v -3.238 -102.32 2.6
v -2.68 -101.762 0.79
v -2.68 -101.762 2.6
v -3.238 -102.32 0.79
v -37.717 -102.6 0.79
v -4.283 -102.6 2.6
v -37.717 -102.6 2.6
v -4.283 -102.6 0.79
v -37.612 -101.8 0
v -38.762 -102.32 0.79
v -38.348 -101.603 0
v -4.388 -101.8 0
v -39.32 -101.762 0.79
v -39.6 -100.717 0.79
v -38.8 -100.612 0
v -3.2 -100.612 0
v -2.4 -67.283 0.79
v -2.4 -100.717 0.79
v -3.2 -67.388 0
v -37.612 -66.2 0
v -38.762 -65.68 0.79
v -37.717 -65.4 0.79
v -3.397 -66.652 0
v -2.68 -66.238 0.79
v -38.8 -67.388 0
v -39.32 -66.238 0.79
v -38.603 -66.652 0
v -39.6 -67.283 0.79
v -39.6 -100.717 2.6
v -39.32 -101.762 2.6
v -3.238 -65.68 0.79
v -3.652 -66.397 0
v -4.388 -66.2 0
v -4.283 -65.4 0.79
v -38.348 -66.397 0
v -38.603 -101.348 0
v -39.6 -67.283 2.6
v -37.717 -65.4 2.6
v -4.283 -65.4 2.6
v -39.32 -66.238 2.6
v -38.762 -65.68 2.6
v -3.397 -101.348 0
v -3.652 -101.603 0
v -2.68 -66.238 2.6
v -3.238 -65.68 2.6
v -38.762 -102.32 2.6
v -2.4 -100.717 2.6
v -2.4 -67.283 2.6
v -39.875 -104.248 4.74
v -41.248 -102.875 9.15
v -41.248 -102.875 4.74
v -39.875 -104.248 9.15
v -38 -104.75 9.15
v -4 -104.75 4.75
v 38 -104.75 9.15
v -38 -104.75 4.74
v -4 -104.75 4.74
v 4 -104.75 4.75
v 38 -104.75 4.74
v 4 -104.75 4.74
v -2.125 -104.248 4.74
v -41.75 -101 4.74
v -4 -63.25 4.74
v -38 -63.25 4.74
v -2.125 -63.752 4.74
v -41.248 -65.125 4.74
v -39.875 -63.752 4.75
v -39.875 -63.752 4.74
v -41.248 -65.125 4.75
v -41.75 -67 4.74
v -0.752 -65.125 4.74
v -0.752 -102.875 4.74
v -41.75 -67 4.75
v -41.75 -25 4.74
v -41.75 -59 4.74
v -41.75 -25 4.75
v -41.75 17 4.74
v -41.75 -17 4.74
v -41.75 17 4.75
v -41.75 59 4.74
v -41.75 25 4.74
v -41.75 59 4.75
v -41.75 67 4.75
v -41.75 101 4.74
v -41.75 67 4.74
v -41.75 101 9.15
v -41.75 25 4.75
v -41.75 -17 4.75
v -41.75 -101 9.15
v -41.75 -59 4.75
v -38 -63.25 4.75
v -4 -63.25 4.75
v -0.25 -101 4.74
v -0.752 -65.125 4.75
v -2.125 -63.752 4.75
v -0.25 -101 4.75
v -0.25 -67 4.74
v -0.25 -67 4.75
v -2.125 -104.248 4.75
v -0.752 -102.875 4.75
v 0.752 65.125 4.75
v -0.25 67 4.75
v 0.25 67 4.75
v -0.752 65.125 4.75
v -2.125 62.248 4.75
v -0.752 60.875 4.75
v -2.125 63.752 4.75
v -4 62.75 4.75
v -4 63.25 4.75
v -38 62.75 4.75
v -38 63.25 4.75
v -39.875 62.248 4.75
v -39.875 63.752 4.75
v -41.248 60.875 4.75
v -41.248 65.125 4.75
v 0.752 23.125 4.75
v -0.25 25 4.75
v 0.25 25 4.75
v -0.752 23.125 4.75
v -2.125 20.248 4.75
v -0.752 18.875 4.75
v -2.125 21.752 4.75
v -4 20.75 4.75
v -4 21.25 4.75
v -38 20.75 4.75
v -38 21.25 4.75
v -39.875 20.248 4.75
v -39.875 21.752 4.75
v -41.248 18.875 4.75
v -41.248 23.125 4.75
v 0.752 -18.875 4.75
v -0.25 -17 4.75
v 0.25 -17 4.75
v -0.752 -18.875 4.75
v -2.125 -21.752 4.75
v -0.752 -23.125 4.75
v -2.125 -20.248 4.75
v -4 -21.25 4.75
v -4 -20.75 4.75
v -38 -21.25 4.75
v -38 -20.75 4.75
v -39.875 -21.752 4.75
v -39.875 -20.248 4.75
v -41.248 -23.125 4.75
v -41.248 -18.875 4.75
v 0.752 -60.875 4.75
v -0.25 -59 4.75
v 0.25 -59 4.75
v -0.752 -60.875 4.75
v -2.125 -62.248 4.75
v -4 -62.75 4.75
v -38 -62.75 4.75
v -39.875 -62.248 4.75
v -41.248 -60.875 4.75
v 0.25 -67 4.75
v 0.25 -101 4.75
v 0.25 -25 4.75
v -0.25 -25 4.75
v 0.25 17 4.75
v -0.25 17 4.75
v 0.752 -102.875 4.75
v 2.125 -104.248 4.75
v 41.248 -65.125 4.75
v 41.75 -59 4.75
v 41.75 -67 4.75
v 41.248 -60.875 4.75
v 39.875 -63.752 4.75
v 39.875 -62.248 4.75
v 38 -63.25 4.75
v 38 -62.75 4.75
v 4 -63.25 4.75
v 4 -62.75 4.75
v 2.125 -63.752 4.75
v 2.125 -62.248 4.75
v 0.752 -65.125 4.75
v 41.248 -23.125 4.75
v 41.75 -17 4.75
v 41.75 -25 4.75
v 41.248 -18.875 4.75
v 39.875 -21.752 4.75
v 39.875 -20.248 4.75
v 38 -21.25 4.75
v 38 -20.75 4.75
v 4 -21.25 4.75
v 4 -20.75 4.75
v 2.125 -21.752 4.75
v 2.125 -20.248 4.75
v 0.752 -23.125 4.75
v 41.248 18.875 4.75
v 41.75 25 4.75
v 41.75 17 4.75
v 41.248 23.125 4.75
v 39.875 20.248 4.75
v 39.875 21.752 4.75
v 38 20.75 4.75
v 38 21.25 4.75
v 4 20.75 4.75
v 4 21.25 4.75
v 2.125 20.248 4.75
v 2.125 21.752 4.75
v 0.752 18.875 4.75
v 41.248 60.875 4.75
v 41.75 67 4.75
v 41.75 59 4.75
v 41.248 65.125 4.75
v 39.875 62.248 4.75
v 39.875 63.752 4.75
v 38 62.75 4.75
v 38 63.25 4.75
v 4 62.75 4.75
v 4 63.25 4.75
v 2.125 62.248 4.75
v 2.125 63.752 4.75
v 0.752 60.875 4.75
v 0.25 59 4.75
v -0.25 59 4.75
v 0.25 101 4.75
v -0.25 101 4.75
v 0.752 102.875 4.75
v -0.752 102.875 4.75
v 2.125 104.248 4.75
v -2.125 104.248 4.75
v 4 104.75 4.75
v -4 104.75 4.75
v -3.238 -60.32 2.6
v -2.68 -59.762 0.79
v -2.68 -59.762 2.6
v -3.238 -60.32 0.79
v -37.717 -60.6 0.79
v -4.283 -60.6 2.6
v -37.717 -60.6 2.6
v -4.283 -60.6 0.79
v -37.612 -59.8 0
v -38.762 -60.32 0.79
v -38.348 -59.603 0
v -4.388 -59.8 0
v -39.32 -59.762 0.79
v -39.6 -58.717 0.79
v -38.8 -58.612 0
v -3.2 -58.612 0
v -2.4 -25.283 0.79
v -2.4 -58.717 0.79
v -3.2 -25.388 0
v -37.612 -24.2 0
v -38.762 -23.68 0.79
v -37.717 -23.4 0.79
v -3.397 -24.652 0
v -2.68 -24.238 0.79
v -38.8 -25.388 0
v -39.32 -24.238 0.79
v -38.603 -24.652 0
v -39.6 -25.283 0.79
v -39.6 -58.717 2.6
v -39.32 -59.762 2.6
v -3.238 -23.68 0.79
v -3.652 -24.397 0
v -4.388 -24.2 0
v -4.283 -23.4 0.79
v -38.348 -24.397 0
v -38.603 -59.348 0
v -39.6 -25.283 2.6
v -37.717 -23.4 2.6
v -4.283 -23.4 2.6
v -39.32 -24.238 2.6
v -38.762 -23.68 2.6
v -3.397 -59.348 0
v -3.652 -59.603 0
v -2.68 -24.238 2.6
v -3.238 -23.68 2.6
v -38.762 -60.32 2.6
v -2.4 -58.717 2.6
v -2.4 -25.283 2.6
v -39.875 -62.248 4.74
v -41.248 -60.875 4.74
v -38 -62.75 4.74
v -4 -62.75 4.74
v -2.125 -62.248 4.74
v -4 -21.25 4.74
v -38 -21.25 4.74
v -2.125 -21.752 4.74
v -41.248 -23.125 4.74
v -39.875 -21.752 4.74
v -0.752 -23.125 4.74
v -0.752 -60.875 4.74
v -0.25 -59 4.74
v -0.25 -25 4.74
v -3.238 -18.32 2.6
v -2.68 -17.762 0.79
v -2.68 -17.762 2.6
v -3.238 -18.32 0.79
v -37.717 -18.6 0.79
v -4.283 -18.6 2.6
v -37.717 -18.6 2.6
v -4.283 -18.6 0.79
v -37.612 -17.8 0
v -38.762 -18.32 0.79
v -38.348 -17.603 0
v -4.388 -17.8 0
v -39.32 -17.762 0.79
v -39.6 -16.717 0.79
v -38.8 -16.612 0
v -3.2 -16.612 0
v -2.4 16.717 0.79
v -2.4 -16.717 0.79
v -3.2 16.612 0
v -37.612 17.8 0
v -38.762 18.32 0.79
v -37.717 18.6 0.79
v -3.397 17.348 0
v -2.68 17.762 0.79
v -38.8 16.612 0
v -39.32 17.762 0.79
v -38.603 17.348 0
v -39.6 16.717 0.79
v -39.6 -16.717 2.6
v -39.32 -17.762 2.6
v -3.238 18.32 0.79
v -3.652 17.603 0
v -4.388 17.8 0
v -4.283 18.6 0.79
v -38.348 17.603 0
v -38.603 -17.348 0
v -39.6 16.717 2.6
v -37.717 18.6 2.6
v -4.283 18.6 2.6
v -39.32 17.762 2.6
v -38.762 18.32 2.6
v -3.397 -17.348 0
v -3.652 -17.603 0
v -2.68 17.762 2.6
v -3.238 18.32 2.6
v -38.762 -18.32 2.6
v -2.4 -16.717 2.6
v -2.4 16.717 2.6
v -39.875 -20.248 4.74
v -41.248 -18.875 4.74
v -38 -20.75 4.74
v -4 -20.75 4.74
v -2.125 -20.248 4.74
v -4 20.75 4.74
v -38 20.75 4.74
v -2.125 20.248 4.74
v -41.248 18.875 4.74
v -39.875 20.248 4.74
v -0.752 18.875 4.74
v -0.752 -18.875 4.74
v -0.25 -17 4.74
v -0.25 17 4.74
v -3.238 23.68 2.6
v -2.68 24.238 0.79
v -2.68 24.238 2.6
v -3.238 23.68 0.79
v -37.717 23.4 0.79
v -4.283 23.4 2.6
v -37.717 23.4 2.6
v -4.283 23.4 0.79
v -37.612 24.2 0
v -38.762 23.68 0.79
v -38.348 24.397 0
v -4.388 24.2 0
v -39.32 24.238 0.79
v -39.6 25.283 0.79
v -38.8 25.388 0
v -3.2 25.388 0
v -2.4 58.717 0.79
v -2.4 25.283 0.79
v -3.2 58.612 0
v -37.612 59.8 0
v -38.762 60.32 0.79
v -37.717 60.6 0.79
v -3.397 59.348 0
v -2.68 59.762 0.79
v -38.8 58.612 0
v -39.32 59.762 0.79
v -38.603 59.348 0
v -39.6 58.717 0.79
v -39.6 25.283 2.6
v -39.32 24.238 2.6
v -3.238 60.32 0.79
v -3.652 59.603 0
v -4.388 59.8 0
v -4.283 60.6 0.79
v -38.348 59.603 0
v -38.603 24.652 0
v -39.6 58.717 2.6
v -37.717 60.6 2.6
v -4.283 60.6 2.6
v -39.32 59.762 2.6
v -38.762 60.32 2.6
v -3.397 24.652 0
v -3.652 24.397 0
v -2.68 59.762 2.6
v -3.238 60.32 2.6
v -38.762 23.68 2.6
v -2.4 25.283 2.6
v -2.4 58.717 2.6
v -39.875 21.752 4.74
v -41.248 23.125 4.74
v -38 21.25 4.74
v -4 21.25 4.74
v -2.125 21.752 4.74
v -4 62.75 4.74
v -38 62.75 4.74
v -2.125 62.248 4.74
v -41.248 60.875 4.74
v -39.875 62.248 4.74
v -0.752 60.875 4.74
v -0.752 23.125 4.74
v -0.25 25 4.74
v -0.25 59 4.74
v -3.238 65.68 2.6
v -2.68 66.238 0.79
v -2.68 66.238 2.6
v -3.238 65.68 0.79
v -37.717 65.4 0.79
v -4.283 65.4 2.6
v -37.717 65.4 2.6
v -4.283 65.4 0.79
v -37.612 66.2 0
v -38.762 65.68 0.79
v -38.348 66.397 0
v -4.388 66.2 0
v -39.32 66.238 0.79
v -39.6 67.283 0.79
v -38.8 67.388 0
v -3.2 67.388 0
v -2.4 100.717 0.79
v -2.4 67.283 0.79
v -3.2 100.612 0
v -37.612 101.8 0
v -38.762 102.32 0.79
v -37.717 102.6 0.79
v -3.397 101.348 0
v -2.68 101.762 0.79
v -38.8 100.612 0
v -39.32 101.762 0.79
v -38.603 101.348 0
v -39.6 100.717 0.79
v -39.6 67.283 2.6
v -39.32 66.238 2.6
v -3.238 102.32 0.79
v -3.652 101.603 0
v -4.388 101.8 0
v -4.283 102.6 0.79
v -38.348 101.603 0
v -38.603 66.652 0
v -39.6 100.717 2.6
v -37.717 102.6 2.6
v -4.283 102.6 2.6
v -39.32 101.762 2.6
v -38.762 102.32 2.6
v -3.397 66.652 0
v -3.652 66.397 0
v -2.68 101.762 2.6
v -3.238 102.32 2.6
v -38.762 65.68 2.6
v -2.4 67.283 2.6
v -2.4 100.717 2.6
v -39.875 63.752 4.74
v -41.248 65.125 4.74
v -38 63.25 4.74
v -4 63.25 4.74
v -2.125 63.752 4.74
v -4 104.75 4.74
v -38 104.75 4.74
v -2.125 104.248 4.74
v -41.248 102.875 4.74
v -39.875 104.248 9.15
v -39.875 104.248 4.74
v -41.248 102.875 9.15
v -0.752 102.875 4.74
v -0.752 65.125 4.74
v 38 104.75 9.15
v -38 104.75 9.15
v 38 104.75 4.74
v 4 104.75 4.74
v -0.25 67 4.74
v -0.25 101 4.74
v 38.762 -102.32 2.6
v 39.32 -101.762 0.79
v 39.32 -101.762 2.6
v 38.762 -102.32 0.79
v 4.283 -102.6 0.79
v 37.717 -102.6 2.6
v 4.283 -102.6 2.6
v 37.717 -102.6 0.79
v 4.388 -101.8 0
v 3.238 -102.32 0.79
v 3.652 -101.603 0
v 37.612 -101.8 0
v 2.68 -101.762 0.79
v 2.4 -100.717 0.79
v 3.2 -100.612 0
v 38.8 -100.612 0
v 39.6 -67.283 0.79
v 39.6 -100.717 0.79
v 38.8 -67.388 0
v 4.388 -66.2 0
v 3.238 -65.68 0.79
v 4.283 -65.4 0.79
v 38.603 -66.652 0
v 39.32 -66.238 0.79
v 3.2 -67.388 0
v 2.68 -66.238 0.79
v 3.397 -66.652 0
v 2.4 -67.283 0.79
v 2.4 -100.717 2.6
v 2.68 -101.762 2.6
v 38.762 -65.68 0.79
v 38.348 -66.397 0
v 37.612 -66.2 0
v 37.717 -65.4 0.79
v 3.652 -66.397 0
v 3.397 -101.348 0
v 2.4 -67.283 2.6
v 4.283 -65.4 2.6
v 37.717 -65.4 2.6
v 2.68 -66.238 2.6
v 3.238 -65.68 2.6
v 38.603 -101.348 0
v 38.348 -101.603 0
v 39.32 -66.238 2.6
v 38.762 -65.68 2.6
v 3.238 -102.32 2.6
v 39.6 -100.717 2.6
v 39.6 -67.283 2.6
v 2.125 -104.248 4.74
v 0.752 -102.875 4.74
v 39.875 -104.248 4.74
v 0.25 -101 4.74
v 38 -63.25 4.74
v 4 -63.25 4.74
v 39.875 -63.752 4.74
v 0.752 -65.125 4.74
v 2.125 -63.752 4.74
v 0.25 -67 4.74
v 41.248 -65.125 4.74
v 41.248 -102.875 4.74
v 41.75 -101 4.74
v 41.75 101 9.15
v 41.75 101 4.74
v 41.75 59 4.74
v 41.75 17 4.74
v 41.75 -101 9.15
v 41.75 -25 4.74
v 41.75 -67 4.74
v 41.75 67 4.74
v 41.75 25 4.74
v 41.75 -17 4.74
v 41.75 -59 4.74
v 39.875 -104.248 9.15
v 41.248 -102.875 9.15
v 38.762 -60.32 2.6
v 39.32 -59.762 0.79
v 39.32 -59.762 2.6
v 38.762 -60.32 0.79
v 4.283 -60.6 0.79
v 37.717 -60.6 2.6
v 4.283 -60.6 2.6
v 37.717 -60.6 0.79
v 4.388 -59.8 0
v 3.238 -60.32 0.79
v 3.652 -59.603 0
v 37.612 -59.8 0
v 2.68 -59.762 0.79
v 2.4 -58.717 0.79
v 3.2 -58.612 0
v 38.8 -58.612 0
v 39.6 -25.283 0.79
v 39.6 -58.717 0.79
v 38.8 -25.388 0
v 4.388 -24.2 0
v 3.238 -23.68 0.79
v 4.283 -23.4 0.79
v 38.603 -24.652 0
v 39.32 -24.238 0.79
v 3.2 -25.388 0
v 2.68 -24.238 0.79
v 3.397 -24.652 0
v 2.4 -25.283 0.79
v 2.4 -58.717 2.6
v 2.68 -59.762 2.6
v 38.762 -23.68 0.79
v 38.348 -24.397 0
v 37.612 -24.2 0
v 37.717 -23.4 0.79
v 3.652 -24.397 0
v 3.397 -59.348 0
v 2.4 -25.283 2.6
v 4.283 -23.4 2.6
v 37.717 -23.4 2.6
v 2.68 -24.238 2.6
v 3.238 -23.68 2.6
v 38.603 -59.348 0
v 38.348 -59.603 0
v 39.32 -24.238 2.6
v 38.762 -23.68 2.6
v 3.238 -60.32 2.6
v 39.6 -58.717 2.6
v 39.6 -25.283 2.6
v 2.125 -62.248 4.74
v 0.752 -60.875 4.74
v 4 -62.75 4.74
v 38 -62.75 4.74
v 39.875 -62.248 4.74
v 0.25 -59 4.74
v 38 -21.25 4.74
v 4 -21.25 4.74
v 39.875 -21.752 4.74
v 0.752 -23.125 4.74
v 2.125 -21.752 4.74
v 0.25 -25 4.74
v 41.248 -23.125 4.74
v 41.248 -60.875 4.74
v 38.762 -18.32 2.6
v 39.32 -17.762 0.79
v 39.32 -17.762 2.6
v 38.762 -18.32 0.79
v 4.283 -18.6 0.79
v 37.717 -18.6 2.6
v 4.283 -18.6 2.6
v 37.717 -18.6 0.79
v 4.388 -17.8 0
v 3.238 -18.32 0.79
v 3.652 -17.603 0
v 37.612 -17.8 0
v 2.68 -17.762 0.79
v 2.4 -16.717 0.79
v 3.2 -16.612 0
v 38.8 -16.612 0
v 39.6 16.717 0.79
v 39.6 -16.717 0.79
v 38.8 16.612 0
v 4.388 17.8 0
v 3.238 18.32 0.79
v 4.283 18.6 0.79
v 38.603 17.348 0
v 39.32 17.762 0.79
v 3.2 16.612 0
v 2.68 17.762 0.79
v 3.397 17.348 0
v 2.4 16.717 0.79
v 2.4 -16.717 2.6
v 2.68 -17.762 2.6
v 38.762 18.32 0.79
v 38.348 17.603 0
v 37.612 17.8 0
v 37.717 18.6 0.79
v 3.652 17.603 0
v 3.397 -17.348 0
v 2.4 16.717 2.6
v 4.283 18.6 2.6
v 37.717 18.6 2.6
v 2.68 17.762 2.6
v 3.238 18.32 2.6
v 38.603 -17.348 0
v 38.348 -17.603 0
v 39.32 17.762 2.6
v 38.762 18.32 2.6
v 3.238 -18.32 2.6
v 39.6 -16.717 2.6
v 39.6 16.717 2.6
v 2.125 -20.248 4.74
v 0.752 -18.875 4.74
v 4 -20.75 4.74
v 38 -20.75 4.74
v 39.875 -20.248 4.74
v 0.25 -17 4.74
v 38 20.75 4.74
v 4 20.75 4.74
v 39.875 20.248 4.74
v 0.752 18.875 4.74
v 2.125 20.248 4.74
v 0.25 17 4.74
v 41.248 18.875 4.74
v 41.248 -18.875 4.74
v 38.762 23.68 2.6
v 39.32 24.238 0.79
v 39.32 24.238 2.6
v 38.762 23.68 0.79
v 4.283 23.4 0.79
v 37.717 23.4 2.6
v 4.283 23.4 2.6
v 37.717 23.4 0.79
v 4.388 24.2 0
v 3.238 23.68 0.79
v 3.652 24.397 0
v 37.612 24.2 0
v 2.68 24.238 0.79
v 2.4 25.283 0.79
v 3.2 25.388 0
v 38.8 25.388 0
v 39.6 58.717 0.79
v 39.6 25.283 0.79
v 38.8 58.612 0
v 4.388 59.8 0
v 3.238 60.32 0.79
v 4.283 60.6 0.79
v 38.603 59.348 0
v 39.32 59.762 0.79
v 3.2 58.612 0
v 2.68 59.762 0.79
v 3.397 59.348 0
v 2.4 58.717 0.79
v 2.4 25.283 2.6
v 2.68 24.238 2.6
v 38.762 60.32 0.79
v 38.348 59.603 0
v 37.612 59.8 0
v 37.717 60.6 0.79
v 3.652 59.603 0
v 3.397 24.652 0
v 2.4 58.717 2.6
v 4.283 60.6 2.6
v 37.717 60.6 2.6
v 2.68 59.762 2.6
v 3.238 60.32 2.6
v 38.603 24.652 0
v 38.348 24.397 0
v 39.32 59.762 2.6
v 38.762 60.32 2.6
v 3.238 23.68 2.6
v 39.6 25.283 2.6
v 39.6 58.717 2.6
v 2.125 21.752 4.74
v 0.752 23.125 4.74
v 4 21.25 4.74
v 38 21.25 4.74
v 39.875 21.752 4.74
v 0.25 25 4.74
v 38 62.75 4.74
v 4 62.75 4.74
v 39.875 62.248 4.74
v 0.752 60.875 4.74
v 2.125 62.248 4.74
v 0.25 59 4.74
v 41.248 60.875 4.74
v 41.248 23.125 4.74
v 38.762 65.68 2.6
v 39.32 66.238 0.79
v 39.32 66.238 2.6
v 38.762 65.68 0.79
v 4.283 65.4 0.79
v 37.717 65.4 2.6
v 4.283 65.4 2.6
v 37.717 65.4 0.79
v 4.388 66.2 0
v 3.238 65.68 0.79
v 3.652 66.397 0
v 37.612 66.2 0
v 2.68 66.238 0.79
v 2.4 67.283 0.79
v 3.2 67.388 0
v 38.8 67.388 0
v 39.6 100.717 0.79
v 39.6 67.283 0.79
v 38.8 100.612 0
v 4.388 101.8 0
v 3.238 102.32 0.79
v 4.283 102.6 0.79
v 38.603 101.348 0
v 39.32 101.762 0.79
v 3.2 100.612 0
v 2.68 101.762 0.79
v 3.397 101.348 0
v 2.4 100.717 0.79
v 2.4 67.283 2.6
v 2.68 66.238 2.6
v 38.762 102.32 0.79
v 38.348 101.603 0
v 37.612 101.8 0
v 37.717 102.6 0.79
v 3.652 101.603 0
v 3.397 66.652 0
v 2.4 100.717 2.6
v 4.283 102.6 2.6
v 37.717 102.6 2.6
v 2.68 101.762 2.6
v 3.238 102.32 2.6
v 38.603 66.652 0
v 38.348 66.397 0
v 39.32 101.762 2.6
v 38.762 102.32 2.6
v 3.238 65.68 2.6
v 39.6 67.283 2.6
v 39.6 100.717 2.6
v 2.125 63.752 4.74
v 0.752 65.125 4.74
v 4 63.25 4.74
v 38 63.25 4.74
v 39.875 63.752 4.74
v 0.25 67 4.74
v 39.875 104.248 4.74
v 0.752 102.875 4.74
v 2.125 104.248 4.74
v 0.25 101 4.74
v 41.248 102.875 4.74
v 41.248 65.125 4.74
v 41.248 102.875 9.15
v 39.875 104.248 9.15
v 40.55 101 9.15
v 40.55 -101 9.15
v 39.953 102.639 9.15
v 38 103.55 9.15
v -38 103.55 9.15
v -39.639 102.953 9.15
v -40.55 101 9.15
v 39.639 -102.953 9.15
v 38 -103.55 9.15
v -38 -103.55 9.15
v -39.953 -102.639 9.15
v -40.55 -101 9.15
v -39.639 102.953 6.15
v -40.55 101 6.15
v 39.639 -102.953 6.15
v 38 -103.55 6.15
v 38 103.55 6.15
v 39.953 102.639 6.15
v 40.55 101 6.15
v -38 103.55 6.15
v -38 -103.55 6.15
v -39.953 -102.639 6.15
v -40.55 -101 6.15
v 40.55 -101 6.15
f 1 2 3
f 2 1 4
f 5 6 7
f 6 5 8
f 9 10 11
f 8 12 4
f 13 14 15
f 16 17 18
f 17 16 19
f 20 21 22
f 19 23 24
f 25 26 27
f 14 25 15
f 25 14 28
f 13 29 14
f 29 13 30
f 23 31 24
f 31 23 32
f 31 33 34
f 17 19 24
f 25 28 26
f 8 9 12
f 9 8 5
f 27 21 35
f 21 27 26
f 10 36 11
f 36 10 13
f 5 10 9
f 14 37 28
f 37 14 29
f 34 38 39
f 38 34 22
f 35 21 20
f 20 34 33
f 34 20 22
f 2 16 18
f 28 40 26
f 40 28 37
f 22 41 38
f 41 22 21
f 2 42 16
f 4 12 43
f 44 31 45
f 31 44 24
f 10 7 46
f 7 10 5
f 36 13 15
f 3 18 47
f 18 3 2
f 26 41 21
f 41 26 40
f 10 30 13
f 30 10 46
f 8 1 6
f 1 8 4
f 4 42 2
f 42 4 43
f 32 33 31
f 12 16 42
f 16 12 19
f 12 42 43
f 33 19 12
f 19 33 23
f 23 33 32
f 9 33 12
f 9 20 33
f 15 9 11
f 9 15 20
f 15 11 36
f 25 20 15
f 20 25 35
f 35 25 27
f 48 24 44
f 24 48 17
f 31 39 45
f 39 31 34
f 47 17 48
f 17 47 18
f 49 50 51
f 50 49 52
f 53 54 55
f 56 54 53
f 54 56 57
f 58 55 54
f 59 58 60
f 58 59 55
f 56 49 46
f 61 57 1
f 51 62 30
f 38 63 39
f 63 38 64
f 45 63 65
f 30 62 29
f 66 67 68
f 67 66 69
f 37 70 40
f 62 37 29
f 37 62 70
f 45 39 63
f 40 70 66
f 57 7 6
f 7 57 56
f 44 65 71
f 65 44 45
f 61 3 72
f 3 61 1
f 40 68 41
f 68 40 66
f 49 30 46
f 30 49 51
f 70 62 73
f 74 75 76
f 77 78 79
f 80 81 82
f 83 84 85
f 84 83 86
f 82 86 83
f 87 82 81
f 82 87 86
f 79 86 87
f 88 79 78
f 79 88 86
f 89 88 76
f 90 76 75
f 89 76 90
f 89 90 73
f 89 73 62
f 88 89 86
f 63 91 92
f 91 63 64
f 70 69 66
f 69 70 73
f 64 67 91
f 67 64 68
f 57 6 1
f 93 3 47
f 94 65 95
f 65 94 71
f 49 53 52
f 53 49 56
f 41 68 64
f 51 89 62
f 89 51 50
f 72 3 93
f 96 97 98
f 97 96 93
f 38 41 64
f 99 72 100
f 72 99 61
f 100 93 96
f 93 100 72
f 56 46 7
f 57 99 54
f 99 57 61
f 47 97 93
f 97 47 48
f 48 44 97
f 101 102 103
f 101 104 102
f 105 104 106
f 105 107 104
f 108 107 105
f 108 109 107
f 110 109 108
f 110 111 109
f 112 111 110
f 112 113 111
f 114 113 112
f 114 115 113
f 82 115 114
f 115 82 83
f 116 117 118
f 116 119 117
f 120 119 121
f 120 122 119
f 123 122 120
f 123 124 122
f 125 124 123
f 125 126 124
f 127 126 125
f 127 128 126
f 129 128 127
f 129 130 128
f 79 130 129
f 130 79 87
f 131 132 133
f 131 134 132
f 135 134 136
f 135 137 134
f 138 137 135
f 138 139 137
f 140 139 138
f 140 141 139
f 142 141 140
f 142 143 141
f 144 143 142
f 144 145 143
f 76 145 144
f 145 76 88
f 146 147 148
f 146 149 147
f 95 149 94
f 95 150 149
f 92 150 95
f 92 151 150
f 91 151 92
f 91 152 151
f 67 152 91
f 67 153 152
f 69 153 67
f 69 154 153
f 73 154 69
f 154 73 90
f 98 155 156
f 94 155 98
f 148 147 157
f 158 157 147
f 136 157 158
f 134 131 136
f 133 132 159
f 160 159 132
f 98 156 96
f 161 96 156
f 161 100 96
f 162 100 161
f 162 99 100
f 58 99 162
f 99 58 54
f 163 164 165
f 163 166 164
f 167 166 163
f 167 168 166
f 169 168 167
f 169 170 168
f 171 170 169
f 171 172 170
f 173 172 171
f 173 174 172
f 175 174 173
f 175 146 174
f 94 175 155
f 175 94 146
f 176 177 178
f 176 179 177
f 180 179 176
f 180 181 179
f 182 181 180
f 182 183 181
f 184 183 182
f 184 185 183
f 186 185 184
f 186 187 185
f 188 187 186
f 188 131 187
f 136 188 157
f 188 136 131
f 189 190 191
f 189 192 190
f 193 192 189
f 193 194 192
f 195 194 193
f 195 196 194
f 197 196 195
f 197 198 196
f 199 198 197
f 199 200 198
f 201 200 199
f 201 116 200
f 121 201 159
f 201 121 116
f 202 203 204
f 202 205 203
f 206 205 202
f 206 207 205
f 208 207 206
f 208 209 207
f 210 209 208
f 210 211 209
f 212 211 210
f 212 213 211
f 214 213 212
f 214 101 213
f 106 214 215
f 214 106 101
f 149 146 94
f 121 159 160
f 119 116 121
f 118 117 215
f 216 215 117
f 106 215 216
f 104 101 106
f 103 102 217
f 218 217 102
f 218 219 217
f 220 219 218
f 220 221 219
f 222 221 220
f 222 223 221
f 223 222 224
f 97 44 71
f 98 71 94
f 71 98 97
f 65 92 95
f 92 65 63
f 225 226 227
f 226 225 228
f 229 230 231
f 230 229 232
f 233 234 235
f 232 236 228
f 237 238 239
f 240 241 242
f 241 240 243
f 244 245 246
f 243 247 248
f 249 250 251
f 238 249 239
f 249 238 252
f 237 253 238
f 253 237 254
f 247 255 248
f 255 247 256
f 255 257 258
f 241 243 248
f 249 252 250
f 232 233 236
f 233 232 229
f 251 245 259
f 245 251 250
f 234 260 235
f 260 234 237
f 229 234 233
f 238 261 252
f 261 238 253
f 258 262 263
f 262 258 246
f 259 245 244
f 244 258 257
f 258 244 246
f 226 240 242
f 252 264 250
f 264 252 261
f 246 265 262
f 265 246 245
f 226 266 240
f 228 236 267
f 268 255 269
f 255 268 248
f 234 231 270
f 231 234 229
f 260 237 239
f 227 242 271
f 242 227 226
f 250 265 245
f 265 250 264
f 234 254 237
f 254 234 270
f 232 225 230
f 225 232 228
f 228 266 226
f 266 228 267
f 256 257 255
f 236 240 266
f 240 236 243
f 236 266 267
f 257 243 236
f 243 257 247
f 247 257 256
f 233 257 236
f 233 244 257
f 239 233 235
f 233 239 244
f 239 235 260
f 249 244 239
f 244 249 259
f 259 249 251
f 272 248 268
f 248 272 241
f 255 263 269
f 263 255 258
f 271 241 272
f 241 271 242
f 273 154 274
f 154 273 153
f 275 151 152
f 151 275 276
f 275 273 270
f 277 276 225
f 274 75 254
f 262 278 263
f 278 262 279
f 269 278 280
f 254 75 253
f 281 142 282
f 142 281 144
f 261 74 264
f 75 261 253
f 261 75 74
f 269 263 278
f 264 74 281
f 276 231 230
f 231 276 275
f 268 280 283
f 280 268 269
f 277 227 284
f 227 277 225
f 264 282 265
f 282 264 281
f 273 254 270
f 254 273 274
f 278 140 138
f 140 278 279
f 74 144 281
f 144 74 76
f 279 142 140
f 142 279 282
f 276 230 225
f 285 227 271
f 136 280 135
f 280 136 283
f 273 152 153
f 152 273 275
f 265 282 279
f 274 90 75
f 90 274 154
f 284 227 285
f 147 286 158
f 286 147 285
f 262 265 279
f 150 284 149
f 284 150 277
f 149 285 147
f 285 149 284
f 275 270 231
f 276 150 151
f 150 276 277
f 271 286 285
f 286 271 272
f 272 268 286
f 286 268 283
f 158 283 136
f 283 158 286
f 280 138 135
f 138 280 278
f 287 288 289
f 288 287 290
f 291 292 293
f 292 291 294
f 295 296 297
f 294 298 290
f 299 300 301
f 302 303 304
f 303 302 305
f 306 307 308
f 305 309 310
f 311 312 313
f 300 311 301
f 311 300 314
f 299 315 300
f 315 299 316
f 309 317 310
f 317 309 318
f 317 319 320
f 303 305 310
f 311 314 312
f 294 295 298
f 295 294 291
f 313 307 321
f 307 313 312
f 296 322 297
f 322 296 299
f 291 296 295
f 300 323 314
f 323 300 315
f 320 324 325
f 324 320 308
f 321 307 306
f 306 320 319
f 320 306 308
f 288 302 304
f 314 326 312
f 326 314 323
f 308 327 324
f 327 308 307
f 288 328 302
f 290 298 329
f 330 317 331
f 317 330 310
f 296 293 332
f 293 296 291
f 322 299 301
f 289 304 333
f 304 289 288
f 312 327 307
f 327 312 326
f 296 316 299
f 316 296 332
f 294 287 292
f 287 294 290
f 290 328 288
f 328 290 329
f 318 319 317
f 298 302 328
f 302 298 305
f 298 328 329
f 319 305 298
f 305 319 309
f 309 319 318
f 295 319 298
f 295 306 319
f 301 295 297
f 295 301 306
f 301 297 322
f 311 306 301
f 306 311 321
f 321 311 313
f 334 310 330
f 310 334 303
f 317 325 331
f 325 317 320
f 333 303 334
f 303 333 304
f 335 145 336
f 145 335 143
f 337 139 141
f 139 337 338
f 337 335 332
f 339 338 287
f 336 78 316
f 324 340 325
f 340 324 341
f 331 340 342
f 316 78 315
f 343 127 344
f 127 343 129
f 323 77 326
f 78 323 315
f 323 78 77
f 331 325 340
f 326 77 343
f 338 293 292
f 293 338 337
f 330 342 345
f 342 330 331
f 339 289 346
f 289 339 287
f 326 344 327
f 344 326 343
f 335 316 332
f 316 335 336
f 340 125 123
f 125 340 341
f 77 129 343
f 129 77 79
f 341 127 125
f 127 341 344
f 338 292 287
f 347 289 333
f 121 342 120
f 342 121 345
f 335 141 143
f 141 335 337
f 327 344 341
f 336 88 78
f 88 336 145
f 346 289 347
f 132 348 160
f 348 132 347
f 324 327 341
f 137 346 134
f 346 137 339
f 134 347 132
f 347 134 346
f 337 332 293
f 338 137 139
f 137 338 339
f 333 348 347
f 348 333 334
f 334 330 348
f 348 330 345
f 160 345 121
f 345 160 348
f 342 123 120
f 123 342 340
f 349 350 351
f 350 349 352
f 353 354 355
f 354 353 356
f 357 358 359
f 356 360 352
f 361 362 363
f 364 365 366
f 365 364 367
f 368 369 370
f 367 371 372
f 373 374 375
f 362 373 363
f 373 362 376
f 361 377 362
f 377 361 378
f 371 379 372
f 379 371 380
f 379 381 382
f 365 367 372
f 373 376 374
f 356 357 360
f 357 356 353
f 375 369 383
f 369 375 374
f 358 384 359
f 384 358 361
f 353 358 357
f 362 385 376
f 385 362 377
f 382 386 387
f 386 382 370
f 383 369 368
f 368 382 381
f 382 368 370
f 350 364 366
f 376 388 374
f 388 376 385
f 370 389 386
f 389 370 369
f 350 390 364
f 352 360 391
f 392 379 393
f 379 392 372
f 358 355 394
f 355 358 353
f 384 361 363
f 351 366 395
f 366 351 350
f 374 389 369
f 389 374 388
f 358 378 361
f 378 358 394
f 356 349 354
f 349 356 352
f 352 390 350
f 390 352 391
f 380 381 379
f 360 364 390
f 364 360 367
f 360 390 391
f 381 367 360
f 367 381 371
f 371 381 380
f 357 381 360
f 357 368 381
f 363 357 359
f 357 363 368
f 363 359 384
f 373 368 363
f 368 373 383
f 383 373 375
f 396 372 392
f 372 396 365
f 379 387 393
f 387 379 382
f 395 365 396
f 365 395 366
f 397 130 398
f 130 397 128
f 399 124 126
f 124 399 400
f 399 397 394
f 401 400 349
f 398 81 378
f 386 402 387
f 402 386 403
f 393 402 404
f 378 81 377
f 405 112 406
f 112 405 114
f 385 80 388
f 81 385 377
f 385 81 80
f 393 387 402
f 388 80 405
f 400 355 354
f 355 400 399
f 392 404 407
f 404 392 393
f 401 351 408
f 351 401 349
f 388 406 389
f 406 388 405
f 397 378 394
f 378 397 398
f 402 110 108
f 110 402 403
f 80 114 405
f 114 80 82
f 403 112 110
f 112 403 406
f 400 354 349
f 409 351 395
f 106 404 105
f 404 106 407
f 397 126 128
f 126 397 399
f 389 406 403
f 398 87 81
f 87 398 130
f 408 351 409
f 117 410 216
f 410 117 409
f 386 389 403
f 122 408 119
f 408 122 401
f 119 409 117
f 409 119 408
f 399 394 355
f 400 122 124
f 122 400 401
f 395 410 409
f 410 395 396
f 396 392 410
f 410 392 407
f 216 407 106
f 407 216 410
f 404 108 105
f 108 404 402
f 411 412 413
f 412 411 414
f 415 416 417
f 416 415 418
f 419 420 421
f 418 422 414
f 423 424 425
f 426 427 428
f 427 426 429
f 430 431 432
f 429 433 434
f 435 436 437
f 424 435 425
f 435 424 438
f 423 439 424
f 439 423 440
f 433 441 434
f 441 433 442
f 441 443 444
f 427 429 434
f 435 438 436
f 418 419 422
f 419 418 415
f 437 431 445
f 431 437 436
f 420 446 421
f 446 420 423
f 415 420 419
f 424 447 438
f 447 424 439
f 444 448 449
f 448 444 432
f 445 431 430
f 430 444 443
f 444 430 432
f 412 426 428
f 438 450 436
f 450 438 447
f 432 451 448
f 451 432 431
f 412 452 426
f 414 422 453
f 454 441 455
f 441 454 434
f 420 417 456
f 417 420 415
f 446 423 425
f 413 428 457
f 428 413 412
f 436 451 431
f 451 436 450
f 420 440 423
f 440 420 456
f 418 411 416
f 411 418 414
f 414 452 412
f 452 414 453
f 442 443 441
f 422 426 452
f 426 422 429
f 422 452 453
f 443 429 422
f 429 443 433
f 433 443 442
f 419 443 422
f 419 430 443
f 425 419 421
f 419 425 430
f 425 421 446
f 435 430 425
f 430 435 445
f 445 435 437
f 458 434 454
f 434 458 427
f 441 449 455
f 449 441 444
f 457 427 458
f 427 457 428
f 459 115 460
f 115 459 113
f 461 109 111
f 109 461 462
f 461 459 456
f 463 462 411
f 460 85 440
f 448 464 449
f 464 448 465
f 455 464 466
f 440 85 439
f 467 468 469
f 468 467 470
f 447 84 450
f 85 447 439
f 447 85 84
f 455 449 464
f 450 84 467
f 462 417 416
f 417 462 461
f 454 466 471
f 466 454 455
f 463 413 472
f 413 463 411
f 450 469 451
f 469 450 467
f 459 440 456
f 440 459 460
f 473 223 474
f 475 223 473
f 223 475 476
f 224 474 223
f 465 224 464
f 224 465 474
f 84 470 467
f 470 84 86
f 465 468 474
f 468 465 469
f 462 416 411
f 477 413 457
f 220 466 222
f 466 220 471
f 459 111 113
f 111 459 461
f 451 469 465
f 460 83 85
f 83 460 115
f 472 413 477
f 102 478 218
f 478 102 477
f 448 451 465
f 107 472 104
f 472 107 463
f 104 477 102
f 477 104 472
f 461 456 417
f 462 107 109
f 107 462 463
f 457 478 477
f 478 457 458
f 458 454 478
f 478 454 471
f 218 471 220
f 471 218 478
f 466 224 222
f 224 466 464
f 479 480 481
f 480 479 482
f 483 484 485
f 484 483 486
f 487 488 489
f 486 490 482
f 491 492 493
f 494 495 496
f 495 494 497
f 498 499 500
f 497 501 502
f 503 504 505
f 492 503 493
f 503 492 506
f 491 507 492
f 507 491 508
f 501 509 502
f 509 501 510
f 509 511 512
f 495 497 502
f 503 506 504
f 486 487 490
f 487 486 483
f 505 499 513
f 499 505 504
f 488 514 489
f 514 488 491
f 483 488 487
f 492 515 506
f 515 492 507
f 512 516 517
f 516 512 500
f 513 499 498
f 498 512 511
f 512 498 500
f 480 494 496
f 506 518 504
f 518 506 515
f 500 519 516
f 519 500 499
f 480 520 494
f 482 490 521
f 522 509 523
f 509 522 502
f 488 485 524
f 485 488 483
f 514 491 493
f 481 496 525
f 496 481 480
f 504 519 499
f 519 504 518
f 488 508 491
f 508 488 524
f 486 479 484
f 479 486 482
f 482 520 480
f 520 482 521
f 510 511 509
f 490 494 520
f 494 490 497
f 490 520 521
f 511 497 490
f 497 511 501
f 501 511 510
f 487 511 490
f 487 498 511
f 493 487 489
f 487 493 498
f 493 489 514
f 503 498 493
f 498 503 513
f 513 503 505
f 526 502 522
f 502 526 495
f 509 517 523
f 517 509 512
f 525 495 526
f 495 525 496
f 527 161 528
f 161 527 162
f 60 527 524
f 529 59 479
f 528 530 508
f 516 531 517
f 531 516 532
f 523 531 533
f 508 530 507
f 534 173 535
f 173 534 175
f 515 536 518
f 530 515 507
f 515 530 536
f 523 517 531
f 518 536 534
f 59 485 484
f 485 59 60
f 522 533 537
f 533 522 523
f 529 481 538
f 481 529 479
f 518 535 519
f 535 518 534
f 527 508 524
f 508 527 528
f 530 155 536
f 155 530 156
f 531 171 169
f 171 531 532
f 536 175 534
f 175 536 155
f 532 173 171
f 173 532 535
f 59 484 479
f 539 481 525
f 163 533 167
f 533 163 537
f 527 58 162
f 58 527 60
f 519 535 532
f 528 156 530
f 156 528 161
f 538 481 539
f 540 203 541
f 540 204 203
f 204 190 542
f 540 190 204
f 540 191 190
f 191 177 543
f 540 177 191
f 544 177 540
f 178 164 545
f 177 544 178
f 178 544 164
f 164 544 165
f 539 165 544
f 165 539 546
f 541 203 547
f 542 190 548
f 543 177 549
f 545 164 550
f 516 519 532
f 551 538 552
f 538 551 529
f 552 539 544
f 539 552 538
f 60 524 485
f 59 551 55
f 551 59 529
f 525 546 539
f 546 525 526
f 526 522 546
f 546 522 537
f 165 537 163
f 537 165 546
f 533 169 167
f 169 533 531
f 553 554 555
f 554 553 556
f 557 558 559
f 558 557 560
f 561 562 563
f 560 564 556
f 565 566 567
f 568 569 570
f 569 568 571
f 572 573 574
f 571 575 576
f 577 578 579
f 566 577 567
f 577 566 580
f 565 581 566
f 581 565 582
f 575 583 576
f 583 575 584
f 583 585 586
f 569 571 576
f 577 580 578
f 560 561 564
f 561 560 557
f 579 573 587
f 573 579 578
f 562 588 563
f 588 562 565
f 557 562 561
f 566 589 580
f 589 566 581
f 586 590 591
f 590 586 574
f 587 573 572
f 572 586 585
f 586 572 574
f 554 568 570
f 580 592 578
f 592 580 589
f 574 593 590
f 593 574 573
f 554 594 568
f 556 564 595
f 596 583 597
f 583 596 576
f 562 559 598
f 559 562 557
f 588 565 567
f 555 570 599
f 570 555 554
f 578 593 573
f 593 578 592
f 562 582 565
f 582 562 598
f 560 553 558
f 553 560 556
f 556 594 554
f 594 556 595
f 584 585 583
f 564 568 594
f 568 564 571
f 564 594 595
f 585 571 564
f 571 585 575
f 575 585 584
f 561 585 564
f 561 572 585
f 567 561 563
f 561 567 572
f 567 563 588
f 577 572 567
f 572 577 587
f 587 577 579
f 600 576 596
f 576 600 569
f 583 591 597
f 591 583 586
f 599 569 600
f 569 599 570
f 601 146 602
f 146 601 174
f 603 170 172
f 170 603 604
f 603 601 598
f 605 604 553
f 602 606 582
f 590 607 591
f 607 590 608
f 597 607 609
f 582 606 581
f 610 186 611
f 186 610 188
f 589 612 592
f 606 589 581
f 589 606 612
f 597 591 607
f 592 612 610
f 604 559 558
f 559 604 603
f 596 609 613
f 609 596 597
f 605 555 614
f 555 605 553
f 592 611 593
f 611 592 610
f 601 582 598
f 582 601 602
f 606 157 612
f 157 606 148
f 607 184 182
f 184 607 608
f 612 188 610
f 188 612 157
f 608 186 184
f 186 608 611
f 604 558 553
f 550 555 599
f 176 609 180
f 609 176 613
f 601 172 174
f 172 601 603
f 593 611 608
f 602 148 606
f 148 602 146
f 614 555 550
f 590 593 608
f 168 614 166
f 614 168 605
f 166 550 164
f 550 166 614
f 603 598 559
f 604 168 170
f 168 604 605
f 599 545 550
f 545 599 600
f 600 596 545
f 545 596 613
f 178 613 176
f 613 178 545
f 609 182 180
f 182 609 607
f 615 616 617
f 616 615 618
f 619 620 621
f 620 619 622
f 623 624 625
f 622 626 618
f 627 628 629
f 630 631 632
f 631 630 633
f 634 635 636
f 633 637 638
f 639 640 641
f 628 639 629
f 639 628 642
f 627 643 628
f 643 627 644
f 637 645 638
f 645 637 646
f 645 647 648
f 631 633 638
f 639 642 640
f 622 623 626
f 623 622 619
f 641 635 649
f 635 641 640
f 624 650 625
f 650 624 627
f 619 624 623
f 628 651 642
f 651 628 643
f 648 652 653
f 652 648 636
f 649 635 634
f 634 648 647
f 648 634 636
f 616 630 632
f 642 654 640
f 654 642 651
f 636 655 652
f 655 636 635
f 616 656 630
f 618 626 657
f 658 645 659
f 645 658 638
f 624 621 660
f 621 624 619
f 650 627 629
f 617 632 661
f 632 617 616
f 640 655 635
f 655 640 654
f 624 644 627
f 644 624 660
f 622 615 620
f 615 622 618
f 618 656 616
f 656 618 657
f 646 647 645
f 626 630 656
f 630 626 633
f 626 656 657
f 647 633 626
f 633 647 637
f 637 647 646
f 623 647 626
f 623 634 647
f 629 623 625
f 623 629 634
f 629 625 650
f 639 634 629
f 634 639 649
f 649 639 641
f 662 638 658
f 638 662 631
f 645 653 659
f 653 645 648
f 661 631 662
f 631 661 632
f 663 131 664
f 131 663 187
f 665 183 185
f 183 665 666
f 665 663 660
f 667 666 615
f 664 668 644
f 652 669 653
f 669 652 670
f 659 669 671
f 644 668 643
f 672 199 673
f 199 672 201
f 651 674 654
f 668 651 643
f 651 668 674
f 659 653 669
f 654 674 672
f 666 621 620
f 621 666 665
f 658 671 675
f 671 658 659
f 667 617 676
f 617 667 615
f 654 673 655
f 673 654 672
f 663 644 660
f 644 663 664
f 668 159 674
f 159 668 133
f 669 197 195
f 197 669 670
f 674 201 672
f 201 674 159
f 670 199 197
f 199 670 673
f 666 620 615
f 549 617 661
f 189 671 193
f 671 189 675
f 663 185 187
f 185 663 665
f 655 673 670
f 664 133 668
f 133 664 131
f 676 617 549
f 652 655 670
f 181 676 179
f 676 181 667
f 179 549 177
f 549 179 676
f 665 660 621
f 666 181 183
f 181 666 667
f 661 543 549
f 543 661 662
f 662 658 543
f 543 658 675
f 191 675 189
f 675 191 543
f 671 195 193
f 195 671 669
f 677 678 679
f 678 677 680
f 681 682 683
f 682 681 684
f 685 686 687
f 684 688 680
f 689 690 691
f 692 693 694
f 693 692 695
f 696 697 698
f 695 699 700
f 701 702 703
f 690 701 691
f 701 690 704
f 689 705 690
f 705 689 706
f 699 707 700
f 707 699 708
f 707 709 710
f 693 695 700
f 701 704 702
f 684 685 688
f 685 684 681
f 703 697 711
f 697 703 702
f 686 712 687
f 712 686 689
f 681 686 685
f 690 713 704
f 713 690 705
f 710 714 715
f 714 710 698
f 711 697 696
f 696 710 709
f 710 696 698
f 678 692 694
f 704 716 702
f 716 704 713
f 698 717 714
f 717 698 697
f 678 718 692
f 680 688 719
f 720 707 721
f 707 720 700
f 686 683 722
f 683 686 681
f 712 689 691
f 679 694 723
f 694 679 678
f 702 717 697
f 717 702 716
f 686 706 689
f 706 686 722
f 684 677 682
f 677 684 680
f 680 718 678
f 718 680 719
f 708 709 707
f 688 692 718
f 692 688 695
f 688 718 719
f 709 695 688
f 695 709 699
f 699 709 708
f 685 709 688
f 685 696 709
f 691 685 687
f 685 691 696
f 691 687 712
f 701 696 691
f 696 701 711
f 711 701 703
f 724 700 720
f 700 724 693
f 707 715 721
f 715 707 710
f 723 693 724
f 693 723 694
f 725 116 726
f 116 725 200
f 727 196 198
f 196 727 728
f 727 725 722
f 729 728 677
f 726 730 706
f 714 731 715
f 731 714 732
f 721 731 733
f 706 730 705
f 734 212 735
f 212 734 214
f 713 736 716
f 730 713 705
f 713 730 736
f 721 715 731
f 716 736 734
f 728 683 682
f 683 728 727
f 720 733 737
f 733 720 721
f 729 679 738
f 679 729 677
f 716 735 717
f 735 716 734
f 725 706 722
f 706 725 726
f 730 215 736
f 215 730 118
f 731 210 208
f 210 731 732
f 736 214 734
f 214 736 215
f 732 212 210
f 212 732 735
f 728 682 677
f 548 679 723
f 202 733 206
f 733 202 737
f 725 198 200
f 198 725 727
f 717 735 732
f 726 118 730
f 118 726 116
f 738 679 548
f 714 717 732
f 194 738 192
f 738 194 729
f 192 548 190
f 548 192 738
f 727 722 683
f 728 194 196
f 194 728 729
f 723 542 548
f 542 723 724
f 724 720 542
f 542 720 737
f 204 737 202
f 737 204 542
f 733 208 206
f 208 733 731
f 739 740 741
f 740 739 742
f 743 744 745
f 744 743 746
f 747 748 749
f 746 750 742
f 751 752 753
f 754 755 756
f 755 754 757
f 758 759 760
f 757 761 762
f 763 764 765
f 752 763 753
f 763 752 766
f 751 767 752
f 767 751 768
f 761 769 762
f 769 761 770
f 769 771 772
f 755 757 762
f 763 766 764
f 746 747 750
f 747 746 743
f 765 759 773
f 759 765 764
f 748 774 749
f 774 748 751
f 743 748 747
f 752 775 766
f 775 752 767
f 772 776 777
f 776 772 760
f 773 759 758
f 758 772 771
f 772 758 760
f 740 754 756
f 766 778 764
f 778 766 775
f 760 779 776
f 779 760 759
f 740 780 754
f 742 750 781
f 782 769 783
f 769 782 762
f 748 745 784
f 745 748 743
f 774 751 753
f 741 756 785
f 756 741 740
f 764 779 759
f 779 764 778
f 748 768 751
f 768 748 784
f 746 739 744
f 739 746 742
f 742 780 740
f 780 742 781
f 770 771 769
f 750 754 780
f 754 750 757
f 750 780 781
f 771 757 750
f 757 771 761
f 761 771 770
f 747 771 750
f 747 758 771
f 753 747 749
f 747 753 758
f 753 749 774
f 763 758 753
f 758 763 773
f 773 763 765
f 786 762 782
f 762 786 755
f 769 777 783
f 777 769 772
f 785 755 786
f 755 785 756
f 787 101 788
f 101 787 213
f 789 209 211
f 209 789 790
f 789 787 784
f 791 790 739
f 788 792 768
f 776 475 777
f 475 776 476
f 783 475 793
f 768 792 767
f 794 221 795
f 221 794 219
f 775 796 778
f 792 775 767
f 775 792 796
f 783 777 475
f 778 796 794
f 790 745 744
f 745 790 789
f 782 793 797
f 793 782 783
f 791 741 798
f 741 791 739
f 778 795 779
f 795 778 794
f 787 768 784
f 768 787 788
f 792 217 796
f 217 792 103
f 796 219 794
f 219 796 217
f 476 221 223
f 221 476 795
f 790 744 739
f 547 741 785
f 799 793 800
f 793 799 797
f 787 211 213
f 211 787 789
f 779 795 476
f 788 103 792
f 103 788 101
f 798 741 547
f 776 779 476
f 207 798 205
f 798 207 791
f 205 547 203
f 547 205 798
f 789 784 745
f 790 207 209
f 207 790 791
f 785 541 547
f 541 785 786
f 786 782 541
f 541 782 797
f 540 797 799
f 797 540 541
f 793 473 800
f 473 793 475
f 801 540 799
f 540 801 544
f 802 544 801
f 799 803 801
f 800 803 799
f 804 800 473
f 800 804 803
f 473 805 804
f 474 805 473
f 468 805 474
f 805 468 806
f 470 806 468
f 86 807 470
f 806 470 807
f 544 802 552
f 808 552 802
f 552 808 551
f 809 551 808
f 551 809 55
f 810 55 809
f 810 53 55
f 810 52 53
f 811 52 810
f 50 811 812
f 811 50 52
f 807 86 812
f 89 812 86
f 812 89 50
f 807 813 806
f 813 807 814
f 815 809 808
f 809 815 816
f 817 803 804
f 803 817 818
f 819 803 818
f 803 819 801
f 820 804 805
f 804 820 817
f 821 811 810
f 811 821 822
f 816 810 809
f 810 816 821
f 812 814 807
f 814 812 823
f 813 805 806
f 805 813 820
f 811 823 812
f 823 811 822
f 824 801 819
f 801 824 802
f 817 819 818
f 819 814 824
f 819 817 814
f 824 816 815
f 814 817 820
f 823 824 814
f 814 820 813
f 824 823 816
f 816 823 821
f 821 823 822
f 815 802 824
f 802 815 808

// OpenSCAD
// file: psu_plate_common.scad
// psu_plate_common — shared parameters for the power-supply plates.
//
// These are PLATES, not bins: a power supply stands on top, and the only wall is
// a short lip to stop it walking off. They latch into the baseplate on standard
// Gridfinity feet like everything else, so the PSU stops sliding on the desk and
// the grid underneath it stays usable.
include <../lib/gridfinity.scad>

// Lip height ABOVE the plate floor. Deliberately small — tall enough to catch a
// foot that shifts, short enough not to interfere with a PSU's own feet or make
// the unit a lift-out. Total part height is BIN_BASE_H + FLOOR + LIP.
LIP   = 3.0;   // [1:0.5:8]
FLOOR = 1.4;

PLATE_H = BIN_BASE_H + FLOOR + LIP;
// main file
// plate_2x5 — 2×5 plate with a short lip, for a power supply to stand on.
//
// PRINT: as emitted, feet down. No supports.
include <psu_plate_common.scad>
bin(2, 5, PLATE_H, floor = FLOOR);
